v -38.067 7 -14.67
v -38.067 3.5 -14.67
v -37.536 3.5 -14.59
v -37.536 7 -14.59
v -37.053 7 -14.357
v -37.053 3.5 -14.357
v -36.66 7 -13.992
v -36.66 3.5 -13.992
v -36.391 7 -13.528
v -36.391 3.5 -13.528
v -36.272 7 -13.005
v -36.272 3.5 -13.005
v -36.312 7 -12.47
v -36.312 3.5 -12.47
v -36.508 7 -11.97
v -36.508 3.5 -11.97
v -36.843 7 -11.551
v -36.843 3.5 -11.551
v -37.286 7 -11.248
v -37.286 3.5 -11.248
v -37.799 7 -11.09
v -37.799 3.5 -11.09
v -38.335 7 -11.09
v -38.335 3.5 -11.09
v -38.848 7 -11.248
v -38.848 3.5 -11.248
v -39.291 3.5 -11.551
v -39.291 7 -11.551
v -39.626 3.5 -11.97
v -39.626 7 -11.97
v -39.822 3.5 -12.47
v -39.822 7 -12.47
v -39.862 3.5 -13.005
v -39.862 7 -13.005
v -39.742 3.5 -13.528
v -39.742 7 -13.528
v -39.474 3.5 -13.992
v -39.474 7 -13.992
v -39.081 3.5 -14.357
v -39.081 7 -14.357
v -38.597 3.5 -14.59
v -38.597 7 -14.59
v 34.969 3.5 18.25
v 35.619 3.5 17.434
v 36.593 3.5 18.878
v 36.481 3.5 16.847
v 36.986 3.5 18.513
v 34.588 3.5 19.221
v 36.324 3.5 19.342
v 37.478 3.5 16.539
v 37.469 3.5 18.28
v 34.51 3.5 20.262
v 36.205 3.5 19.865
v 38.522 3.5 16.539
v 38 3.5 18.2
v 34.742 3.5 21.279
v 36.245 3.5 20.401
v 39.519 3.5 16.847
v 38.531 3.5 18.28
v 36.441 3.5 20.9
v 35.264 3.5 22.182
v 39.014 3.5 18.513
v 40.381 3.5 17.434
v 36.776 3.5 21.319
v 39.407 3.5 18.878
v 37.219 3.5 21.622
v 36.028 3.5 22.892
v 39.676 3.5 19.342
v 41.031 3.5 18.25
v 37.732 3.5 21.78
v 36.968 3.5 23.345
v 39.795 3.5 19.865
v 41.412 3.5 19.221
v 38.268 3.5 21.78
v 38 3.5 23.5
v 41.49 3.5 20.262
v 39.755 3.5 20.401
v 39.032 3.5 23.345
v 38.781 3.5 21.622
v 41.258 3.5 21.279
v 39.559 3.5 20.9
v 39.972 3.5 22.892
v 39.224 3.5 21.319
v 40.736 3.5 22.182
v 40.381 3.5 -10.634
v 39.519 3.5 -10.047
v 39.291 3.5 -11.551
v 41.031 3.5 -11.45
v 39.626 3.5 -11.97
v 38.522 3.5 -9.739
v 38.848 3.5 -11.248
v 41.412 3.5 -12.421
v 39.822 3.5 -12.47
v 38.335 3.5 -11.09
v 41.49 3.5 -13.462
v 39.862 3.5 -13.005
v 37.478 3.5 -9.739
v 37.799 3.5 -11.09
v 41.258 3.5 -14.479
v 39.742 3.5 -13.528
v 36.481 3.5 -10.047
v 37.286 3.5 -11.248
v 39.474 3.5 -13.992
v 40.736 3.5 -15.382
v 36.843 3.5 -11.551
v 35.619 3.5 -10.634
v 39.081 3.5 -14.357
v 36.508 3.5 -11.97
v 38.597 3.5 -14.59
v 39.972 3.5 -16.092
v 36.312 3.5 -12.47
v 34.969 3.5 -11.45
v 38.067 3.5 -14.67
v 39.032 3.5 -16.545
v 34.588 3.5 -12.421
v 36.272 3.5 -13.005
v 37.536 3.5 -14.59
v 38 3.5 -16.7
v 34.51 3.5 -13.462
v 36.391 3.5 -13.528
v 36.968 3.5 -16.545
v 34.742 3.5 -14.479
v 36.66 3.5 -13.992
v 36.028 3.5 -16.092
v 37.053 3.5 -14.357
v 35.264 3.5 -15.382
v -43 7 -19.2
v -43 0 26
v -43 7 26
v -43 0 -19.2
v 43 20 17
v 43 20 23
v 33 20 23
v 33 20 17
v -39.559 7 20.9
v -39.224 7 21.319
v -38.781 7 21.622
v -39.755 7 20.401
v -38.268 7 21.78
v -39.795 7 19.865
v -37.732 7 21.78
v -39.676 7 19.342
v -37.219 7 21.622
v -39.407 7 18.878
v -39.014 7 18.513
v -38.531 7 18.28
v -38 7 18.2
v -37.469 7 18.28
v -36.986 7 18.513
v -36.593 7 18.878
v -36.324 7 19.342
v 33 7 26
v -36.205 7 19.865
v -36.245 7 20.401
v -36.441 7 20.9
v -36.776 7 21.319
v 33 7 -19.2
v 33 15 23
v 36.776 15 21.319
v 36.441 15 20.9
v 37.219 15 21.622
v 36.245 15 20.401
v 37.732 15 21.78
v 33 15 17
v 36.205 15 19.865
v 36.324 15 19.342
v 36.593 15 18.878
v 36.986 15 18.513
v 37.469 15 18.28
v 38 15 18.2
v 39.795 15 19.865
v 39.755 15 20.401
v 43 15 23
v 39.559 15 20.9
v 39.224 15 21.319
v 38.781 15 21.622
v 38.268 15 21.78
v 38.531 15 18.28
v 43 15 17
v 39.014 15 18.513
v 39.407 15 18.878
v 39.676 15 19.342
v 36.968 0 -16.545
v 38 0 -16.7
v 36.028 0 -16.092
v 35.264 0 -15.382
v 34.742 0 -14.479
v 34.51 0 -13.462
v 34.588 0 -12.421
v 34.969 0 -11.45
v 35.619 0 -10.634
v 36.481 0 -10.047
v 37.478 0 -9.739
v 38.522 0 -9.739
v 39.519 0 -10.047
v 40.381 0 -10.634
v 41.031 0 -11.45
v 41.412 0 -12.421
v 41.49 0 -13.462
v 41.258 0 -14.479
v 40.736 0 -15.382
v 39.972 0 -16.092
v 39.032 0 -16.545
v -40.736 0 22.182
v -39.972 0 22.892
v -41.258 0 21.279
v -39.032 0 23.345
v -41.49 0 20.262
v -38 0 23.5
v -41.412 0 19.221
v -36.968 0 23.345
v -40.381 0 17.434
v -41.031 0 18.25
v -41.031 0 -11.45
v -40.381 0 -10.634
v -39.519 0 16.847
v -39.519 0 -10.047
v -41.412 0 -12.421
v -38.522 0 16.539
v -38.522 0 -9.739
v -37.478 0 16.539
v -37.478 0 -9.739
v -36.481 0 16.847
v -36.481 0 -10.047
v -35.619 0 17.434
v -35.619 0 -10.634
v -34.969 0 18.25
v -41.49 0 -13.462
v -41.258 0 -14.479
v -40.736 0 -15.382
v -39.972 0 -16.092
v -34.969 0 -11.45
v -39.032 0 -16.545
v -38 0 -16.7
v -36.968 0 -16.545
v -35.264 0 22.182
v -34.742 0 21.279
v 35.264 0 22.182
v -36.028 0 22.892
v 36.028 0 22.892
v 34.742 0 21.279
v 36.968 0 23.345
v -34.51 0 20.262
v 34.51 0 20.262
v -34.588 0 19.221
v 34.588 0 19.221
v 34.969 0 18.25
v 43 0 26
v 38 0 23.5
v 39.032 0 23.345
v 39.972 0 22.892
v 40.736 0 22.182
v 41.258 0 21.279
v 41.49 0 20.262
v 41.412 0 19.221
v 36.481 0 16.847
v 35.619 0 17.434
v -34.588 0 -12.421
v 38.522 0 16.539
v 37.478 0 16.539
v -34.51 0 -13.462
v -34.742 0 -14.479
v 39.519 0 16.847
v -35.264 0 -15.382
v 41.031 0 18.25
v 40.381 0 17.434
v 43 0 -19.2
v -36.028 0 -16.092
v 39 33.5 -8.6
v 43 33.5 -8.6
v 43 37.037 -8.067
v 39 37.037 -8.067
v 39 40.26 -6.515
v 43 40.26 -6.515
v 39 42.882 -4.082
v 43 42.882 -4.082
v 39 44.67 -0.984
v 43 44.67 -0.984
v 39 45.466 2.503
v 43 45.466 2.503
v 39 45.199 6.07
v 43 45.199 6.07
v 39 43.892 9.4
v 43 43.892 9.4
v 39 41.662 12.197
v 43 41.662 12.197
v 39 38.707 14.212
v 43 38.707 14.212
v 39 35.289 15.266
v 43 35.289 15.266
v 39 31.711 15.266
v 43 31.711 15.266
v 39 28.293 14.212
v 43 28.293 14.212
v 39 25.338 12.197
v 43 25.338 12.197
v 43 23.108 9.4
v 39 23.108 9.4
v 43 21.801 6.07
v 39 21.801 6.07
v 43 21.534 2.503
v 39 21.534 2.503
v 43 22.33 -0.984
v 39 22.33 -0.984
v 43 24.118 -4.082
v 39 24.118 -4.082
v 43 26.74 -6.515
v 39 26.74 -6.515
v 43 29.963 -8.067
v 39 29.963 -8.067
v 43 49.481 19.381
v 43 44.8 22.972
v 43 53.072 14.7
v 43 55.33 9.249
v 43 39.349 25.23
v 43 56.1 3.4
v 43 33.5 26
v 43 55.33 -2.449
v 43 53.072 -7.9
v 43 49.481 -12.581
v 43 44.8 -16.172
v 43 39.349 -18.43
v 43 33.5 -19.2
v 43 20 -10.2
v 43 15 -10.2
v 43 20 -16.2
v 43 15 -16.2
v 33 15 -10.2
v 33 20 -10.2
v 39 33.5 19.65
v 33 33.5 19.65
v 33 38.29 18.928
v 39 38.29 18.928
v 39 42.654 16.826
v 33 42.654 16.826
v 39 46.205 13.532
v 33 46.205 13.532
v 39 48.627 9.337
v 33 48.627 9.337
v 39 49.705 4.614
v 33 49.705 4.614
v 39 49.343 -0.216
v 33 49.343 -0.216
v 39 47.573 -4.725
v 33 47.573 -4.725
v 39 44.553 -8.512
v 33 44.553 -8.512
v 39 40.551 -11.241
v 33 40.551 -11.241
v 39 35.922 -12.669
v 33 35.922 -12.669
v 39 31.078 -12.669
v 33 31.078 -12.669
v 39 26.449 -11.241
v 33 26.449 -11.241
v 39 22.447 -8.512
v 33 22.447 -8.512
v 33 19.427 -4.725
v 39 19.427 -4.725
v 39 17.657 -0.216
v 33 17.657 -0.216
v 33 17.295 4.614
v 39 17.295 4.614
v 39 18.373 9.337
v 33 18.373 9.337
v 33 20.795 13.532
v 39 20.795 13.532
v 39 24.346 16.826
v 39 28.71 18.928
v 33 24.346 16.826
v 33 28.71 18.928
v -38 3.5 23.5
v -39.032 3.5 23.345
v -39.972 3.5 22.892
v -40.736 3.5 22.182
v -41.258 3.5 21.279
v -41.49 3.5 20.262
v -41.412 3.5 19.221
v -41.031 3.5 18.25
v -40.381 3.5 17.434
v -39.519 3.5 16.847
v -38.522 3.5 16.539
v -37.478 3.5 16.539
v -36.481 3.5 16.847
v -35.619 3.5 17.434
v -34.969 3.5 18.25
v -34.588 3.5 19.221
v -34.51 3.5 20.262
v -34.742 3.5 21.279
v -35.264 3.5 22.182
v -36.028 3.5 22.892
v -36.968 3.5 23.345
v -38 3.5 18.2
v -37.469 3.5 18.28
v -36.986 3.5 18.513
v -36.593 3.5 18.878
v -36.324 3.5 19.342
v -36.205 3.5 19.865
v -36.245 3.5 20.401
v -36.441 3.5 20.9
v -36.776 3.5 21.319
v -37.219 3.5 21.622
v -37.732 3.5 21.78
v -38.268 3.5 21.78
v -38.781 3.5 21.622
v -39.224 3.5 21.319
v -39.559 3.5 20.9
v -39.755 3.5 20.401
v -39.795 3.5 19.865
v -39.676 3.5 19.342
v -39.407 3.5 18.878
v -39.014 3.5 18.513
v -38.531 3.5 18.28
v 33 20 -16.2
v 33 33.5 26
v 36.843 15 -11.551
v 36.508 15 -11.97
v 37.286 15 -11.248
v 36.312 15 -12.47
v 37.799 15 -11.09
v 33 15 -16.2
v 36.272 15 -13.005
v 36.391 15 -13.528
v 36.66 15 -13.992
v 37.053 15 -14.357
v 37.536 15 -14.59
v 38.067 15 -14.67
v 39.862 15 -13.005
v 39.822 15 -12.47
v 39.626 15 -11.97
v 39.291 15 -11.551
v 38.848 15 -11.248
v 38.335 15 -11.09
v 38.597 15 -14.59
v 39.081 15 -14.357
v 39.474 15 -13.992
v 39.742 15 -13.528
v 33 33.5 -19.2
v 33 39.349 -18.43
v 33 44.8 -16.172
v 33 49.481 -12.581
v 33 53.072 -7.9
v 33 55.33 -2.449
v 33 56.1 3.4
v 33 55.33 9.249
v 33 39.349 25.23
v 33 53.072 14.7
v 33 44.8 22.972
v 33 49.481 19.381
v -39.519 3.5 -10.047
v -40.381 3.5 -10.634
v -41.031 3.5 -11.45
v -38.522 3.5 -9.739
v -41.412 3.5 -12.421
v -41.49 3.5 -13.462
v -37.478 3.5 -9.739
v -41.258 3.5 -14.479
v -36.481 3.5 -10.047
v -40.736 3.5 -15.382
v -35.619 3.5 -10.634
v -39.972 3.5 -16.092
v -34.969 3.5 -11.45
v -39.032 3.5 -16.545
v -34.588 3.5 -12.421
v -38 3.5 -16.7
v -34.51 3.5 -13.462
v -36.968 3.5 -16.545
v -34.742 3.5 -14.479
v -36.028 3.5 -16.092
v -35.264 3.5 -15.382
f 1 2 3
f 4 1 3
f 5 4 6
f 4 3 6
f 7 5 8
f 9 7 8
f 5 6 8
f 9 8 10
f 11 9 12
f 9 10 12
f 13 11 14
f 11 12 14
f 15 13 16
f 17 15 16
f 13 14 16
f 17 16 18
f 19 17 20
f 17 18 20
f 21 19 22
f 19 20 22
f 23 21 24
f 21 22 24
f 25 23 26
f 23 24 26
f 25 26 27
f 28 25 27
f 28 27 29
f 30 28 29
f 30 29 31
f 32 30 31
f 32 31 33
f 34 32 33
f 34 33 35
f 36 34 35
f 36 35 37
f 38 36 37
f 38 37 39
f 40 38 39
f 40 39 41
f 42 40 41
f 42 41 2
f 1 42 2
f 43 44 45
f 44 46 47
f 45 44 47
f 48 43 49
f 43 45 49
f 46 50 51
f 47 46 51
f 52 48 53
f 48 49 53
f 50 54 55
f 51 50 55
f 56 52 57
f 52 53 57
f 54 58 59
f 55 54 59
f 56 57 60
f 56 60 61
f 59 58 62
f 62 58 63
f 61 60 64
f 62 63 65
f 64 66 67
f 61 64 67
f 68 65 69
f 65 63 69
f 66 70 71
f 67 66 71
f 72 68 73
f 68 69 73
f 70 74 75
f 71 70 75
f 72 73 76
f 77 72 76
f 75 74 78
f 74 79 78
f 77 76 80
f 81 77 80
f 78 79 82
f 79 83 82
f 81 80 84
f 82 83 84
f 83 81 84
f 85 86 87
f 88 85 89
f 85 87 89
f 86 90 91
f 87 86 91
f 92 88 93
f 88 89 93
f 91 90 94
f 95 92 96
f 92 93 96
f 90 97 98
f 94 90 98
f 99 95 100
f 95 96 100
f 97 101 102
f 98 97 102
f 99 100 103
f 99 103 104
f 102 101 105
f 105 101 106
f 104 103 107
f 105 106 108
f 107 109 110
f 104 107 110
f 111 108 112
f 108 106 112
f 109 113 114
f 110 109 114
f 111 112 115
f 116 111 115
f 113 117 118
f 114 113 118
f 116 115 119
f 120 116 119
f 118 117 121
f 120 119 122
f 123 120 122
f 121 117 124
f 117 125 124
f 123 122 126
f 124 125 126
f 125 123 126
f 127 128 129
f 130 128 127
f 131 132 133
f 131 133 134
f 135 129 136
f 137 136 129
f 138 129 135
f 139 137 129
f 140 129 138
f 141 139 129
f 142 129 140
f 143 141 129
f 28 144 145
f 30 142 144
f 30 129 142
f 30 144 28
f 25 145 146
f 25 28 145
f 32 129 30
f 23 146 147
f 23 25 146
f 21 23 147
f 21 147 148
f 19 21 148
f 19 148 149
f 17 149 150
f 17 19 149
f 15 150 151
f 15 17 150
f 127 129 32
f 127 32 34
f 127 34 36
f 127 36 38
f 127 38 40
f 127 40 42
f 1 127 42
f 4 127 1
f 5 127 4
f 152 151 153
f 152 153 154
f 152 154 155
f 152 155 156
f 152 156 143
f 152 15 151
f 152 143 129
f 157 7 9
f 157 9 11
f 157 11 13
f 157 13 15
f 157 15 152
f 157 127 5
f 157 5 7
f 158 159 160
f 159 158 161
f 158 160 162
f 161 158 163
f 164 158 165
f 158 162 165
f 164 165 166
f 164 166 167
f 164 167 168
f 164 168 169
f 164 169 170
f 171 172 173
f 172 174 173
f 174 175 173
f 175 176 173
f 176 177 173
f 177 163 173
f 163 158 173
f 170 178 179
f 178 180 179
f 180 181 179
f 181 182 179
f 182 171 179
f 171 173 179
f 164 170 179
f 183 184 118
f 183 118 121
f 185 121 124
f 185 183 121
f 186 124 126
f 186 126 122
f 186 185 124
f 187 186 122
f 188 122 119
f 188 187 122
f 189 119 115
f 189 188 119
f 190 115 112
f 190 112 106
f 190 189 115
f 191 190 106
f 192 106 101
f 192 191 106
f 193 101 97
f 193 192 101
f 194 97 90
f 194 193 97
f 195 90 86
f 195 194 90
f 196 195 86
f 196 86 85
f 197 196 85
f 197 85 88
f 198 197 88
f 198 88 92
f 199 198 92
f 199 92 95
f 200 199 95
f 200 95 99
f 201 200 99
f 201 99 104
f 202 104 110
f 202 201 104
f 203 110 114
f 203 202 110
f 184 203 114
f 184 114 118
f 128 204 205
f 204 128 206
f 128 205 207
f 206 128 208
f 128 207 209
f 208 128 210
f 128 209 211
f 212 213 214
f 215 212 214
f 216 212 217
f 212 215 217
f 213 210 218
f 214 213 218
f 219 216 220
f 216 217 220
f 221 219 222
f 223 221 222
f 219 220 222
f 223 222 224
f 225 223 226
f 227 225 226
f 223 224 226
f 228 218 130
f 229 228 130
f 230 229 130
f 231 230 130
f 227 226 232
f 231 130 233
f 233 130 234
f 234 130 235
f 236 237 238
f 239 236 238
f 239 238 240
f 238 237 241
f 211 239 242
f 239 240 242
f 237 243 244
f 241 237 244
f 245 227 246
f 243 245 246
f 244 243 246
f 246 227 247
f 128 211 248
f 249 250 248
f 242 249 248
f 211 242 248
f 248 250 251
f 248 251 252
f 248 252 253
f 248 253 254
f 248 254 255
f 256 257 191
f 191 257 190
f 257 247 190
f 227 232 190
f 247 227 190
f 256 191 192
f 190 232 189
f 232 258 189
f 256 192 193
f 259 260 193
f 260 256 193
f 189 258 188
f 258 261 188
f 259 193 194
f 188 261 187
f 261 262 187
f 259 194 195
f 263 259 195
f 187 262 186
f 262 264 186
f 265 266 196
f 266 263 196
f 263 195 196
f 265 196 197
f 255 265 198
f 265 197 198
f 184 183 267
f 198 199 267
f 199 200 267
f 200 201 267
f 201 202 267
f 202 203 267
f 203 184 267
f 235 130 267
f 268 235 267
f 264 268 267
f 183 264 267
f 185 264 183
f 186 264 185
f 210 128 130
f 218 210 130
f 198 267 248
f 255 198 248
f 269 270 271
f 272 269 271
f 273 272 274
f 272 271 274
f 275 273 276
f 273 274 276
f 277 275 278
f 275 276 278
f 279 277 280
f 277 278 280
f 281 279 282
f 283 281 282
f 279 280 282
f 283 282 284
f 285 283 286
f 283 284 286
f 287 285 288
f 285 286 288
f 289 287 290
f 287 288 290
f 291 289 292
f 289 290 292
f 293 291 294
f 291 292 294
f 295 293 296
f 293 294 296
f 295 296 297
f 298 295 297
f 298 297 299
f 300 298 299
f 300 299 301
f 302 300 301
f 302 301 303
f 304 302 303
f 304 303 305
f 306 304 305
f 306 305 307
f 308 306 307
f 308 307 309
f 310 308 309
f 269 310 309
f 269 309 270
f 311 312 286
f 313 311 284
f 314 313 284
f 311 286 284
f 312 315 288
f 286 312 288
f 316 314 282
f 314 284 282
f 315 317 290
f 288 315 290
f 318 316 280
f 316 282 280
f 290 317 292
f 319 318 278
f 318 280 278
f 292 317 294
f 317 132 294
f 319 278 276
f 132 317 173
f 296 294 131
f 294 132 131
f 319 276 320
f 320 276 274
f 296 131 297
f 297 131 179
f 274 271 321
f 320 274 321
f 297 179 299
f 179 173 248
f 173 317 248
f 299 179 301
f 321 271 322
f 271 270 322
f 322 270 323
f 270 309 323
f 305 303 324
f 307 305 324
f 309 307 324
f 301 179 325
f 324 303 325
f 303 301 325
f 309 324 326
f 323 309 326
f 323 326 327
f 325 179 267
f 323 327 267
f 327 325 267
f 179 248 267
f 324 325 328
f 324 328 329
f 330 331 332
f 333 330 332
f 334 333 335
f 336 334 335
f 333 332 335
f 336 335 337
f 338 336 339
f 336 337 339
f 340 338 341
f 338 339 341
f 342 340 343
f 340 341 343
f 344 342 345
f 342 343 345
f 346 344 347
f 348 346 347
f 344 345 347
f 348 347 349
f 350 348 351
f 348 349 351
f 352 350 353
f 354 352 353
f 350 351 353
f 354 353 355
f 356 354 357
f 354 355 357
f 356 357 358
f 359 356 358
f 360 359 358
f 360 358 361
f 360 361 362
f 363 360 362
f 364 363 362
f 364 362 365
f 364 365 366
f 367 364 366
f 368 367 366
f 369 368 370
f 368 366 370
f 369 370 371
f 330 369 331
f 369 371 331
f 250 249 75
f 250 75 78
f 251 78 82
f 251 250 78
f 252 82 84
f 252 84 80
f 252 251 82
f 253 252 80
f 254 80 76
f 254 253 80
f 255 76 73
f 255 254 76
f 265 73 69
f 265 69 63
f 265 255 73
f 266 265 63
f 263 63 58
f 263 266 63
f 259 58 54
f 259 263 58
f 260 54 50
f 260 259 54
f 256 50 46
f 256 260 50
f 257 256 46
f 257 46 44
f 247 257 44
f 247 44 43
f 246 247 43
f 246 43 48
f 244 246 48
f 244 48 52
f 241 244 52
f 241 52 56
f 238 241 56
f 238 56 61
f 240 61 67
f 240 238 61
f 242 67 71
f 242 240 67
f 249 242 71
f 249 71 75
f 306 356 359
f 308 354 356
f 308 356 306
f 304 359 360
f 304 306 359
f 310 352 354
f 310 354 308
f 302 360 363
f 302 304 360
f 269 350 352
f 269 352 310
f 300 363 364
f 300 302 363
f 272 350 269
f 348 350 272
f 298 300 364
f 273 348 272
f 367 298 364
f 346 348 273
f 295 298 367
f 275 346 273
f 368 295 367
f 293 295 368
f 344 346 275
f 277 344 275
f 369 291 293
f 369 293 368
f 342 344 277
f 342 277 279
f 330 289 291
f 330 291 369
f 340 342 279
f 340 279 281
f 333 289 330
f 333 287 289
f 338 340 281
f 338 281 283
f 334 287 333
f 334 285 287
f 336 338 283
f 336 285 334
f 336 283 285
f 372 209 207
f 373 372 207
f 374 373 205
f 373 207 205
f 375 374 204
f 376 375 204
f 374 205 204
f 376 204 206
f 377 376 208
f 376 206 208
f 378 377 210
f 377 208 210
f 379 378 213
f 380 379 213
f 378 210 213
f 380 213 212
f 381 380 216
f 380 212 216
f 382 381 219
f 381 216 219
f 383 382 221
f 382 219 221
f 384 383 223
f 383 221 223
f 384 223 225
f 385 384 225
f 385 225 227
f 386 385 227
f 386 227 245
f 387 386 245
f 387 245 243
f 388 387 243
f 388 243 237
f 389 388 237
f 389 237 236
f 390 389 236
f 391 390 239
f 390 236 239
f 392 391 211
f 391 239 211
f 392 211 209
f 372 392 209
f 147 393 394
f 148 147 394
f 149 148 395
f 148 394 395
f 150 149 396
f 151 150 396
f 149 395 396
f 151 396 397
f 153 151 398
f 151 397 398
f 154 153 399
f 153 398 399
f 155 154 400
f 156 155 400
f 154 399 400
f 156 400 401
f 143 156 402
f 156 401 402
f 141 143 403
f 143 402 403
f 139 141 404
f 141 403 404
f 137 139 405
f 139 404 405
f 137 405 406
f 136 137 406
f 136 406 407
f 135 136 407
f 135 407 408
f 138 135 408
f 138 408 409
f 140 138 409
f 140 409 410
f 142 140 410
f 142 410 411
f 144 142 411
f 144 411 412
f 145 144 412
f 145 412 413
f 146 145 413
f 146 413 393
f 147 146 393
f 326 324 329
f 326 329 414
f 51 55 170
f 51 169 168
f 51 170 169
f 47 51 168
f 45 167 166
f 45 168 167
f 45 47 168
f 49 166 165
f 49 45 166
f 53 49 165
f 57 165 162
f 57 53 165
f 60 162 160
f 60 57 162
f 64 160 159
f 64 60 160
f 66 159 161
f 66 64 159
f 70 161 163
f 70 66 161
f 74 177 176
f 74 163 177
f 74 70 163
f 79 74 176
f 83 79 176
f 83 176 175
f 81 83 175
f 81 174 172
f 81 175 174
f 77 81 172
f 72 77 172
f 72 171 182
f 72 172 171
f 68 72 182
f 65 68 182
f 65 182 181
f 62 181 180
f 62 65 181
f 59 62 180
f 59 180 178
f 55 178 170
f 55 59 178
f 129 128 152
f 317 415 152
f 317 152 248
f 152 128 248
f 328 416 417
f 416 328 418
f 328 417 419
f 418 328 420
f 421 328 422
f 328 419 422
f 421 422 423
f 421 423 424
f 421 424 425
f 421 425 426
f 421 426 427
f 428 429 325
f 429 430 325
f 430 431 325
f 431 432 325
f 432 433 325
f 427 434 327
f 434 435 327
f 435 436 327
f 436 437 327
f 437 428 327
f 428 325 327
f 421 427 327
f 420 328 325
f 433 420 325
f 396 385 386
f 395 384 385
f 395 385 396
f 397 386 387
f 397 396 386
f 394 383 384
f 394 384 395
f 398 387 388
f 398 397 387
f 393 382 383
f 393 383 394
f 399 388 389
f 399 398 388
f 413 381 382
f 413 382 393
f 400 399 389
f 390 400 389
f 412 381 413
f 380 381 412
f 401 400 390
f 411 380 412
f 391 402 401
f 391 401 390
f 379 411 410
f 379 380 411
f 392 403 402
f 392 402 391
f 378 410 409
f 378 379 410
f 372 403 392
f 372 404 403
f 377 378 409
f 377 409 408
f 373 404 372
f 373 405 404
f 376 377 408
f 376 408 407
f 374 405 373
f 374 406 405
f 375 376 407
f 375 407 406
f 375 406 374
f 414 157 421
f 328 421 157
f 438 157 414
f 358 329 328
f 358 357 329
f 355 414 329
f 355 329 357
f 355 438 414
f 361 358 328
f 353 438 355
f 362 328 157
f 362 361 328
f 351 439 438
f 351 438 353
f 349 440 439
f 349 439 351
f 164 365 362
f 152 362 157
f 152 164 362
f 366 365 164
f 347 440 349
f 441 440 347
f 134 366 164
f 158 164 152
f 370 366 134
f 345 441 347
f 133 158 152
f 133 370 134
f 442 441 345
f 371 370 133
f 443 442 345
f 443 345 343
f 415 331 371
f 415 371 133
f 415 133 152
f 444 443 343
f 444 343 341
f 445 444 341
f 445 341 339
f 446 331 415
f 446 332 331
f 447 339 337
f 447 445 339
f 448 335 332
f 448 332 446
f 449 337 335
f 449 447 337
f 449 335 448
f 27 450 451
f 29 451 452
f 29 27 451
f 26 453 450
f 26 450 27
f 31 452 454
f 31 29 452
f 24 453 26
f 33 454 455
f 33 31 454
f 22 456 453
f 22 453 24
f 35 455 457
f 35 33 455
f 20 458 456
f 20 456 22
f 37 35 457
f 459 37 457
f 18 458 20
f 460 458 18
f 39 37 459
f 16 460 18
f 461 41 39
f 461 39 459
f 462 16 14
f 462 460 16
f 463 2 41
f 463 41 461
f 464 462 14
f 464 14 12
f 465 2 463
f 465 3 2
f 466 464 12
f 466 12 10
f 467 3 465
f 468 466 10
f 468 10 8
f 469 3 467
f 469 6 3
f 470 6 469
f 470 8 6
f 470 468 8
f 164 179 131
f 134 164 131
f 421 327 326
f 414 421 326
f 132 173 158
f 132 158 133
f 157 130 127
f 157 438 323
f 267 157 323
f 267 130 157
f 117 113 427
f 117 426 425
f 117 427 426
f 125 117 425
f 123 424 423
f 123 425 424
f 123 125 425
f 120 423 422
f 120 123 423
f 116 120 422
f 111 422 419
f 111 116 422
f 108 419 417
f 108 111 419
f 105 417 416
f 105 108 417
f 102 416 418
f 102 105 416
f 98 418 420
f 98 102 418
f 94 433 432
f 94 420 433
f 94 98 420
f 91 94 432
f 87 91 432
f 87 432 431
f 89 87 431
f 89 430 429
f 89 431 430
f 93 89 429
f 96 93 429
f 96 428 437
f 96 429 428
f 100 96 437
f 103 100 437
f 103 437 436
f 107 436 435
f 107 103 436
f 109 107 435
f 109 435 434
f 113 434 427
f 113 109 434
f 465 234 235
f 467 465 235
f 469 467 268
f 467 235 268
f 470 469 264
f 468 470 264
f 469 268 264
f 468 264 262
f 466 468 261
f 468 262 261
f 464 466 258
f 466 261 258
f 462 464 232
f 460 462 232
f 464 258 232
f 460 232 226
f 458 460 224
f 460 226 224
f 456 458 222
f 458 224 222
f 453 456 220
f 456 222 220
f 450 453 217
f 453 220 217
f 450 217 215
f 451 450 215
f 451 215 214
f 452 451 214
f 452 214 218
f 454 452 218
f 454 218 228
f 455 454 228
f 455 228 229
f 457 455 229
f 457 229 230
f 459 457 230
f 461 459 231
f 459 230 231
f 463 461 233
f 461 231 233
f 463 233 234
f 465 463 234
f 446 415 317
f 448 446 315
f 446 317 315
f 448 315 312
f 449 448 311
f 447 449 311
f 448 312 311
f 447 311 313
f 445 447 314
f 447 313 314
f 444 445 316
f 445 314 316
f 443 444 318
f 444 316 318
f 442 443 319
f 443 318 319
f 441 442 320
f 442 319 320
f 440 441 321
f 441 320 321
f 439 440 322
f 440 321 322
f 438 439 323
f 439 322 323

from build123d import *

# Parameters (mm, degrees)
SKETCH_1_W          = 86
SKETCH_1_H          = 45.2
EXTRUDE_1_DEPTH     = 7
SKETCH_4_R          = 12
SKETCH_4_W          = 6
SKETCH_4_H          = 5
EXTRUDE_2_DEPTH     = 10
SKETCH_5_R          = 16.25
CUT_EXTRUDE_1_DEPTH = 6
SKETCH_6_R          = 1.8
CUT_EXTRUDE_2_DEPTH = 20
SKETCH_7_R          = 3.5
CUT_EXTRUDE_3_DEPTH = 3.5


with BuildPart() as part:
    # 草图1 → 凸台-拉伸1 (new body)
    with BuildSketch(Plane(origin=(0, 0, 0), x_dir=(1, 0, 0), z_dir=(0, 1, 0))):
        with Locations((0, -3.4)):
            Rectangle(SKETCH_1_W, SKETCH_1_H)
    extrude(amount=EXTRUDE_1_DEPTH)

    # 草图4 → 凸台-拉伸2 (add)
    with BuildSketch(Plane(origin=(43, 0, 0), x_dir=(0, 0, -1), z_dir=(1, 0, 0))):
        with BuildLine():
            Line((19.2, 0), (-26, 0))
            Line((-26, 0), (-26, 33.5))
            ThreePointArc((-26, 33.5), (-3.4, 56.1), (19.2, 33.5))
            Line((19.2, 33.5), (19.2, 0))
        make_face()
        with Locations((-3.4, 33.5)):
            Circle(SKETCH_4_R, mode=Mode.SUBTRACT)
        with Locations((-20, 17.5)):
            Rectangle(SKETCH_4_W, SKETCH_4_H, mode=Mode.SUBTRACT)
        with Locations((13.2, 17.5)):
            Rectangle(SKETCH_4_W, SKETCH_4_H, mode=Mode.SUBTRACT)
    extrude(amount=-EXTRUDE_2_DEPTH)

    # 草图5 → 切除-拉伸1 (cut)
    with BuildSketch(Plane.ZY.offset(-33)):
        with Locations((3.4, 33.5)):
            Circle(SKETCH_5_R)
    extrude(amount=-CUT_EXTRUDE_1_DEPTH, mode=Mode.SUBTRACT)

    # 草图6 → 切除-拉伸2 (cut)
    with BuildSketch(Plane(origin=(0, 0, 0), x_dir=(1, 0, 0), z_dir=(0, 1, 0))):
        with Locations(Location((38, -20, 0), (0, 0, 90))):
            Circle(SKETCH_6_R)
        with Locations(Location((38.066919359, 12.870051801, 0), (0, 0, 90))):
            Circle(SKETCH_6_R)
    cut_extrude_2 = extrude(amount=CUT_EXTRUDE_2_DEPTH, mode=Mode.SUBTRACT)

    # 草图7 → 切除-拉伸3 (cut)
    with BuildSketch(Plane(origin=(0, 0, 0), x_dir=(1, 0, 0), z_dir=(0, 1, 0))):
        with Locations(Location((38, -20, 0), (0, 0, 270))):
            Circle(SKETCH_7_R)
        with Locations(Location((38, 13.2, 0), (0, 0, 90))):
            Circle(SKETCH_7_R)
    cut_extrude_3 = extrude(amount=CUT_EXTRUDE_3_DEPTH, mode=Mode.SUBTRACT)

    # 镜向1: 切除-拉伸2, 切除-拉伸3 across plane
    add(cut_extrude_2.mirror(Plane.ZY), mode=Mode.SUBTRACT)
    add(cut_extrude_3.mirror(Plane.ZY), mode=Mode.SUBTRACT)


solid = part.part
